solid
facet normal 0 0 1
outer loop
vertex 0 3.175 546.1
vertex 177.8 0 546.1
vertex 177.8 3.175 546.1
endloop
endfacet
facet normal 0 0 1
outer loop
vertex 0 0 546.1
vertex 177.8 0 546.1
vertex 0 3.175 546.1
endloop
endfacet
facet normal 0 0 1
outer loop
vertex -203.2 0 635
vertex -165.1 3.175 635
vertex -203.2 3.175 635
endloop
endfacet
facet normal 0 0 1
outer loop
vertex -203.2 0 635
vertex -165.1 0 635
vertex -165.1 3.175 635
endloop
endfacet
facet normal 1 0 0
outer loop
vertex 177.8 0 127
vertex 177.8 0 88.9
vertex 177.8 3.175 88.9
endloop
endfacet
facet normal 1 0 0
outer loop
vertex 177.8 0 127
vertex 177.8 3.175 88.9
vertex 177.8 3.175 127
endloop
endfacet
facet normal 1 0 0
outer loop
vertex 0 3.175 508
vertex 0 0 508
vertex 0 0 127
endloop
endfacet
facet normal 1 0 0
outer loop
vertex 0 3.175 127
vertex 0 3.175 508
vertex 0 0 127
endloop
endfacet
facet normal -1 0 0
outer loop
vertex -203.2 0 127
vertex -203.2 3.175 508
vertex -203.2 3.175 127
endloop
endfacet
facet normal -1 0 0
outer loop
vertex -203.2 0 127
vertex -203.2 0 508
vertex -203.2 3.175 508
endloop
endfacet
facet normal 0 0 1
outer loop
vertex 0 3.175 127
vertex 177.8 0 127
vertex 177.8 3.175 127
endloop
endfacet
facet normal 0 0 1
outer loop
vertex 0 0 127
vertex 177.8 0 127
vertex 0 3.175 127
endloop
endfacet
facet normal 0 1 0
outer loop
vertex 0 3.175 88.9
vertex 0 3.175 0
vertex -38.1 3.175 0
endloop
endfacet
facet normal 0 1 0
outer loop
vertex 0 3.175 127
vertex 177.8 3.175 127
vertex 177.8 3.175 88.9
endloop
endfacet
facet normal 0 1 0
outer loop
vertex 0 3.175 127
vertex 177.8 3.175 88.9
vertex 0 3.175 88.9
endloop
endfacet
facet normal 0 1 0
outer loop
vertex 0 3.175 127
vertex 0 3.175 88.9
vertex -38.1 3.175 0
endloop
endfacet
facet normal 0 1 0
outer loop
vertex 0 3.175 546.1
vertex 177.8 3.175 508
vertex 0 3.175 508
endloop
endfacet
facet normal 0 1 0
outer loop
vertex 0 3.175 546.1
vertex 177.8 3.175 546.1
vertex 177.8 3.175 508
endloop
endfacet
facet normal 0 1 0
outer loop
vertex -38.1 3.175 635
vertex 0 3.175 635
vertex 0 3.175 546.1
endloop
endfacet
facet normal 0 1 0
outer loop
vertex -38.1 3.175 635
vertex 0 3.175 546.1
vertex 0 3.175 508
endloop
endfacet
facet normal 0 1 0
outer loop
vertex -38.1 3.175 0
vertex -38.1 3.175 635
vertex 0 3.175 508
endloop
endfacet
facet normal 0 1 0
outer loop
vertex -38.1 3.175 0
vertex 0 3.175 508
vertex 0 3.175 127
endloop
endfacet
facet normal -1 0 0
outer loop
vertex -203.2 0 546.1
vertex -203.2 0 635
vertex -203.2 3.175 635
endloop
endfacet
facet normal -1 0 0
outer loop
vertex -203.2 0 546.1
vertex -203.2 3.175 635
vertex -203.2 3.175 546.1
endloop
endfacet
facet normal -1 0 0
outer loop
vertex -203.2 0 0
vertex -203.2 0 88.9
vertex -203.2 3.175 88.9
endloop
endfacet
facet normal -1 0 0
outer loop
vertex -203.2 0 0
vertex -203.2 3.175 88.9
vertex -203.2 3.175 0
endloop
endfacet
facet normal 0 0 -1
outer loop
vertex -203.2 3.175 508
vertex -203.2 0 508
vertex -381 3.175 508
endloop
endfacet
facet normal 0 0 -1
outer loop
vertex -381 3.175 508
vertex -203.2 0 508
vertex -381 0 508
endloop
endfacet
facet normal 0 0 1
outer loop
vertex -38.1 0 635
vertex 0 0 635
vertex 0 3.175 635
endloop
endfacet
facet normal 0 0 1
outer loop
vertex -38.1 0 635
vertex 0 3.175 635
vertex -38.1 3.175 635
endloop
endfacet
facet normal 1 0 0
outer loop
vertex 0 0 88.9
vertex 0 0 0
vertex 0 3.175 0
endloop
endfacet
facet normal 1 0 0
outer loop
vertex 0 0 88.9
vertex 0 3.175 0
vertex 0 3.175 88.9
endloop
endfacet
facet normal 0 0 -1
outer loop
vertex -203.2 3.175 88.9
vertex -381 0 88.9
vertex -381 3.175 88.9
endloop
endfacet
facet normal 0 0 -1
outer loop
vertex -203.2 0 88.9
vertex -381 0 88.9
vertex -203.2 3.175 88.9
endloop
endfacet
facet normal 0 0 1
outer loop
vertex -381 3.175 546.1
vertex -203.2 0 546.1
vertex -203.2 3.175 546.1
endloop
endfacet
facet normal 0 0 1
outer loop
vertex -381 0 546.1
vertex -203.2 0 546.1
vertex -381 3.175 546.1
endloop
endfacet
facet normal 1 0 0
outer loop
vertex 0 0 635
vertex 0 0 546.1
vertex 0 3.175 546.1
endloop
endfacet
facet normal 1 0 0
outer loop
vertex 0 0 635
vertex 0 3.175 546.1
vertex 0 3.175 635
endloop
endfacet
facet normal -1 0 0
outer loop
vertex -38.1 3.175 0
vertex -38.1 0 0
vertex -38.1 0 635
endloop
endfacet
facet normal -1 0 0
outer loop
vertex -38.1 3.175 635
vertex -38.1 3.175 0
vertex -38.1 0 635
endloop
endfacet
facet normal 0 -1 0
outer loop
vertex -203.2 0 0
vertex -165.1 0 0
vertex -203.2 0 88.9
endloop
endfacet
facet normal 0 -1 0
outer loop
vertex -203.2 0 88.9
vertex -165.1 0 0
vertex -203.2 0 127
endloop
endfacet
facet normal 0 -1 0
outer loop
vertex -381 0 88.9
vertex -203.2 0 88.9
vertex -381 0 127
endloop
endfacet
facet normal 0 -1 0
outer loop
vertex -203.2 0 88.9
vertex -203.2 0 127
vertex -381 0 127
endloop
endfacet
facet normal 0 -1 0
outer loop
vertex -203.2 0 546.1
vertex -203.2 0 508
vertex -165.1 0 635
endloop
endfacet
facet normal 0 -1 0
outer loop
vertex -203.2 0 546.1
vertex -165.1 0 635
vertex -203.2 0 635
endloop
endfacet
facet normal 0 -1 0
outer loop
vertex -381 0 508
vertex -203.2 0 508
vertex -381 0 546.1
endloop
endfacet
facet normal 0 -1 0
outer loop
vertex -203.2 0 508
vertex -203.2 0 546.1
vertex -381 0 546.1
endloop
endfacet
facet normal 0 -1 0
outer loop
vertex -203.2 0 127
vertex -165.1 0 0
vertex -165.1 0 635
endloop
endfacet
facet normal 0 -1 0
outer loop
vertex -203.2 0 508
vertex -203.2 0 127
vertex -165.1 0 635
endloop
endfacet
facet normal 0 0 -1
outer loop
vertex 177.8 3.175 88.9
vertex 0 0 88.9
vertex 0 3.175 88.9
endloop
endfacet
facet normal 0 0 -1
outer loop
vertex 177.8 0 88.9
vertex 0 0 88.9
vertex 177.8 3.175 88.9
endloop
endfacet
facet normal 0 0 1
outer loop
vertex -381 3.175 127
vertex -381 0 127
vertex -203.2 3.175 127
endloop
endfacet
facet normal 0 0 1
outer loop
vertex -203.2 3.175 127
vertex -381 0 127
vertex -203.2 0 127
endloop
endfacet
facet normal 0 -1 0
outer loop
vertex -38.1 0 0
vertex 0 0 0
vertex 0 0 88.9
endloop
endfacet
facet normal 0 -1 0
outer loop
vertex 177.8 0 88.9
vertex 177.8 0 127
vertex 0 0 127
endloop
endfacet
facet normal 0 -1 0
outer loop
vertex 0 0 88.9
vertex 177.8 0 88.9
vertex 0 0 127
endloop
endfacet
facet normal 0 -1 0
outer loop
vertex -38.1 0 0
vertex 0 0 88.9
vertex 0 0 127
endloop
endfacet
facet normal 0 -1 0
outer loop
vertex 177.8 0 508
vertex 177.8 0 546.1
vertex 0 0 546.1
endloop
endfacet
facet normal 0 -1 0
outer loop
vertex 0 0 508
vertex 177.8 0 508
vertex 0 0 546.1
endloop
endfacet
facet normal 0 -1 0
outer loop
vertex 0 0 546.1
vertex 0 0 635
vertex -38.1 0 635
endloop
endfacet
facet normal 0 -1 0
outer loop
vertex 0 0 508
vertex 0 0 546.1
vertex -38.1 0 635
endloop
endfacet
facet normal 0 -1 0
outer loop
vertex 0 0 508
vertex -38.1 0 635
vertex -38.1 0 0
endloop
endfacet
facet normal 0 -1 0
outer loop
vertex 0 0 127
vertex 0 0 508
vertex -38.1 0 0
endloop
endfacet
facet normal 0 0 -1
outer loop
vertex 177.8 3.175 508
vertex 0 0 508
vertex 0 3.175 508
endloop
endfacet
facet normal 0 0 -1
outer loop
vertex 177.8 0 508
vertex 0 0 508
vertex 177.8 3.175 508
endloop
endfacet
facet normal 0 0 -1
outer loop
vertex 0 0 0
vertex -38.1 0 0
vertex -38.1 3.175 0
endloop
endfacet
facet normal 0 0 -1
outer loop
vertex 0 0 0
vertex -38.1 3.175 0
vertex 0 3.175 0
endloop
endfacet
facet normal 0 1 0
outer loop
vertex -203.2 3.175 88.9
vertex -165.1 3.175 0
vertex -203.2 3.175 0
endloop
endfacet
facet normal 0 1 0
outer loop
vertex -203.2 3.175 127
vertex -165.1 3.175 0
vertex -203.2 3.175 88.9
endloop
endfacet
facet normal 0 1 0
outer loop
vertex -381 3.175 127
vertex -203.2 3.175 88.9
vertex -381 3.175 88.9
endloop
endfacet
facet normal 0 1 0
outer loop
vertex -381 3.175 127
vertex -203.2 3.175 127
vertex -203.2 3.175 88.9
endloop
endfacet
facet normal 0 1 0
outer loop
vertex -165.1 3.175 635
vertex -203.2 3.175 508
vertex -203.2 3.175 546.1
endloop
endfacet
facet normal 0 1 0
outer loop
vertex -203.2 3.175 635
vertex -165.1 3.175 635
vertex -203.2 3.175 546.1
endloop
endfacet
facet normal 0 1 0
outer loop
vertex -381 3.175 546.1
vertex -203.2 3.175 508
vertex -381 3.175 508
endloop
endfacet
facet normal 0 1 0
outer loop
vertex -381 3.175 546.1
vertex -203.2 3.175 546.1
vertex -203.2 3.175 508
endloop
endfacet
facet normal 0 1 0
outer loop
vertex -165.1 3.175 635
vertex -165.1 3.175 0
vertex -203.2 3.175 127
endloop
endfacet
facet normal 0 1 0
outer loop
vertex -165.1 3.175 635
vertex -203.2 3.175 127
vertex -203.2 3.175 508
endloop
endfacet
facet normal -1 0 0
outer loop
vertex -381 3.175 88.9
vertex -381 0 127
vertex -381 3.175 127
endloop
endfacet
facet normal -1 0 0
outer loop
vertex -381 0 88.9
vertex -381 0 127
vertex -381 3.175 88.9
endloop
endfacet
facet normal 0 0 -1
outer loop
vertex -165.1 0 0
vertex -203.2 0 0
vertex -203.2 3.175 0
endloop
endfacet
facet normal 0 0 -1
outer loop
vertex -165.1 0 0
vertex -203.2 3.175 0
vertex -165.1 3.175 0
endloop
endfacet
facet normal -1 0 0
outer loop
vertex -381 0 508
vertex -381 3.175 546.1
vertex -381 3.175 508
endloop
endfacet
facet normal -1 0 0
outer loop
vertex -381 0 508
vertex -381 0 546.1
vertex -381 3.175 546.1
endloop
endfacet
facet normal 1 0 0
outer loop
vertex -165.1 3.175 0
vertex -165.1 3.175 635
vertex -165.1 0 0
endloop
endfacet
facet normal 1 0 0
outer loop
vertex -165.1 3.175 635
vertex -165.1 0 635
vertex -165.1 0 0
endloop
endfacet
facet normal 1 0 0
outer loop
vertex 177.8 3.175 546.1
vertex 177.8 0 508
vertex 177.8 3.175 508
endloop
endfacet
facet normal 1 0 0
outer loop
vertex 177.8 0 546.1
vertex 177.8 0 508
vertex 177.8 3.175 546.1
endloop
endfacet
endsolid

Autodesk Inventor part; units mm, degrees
ref_plane "YZ Plane" through (0, 0, 0) normal (1, 0, 0) x (0, 1, 0)
ref_plane "XZ Plane" through (0, 0, 0) normal (0, 1, 0) x (-1, 0, 0)
ref_plane "XY Plane" through (0, 0, 0) normal (0, 0, 1) x (1, 0, 0)
sketch "Sketch1" plane through (0, 0, 0) normal (0, 1, 0) x (-1, 0, 0)
  line L0 (0, 0) -> (0, 88.9)
  line L1 (0, 88.9) -> (-177.8, 88.9)
  line L2 (-177.8, 88.9) -> (-177.8, 546.1)
  line L3 (-177.8, 546.1) -> (0, 546.1)
  line L4 (0, 546.1) -> (0, 635)
  line L5 (0, 635) -> (203.2, 635)
  line L6 (203.2, 635) -> (203.2, 546.1)
  line L7 (203.2, 546.1) -> (381, 546.1)
  line L8 (381, 546.1) -> (381, 88.9)
  line L9 (381, 88.9) -> (203.2, 88.9)
  line L10 (203.2, 88.9) -> (203.2, 0)
  line L11 (203.2, 0) -> (0, 0)
  dimension "d0" = 88.9
  dimension "d1" = 177.8
  dimension "d2" = 88.9
  dimension "d3" = 177.8
  dimension "d4" = 177.8
  dimension "d5" = 88.9
  dimension "d6" = 177.8
  dimension "d7" = 88.9
  dimension "d8" = 558.8
  dimension "d9" = 635
extrude "Extrusion1" add sketch "Sketch1" along normal blind 3.175
sketch "Sketch2" plane through (0, 0, 0) normal (0, -1, 0) x (1, 0, 0)
  line L0 (0, 0) -> (0, 88.9) projected
  line L1 (0, 546.1) -> (0, 635) projected
  line L2 (0, 635) -> (-203.2, 635) projected
  line L3 (-203.2, 546.1) -> (-381, 546.1) projected
  line L4 (-381, 88.9) -> (-203.2, 88.9) projected
  line L5 (-203.2, 0) -> (0, 0) projected
  line L6 (-38.1, 635) -> (-165.1, 635)
  line L7 (-165.1, 635) -> (-165.1, 0)
  line L8 (-165.1, 0) -> (-38.1, 0)
  line L9 (-38.1, 0) -> (-38.1, 635)
  line L10 (0, 546.1) -> (0, 88.9)
  line L11 (-203.2, 546.1) -> (-203.2, 88.9)
  line L12 (-203.2, 508) -> (-381, 508)
  line L13 (-381, 508) -> (-381, 127)
  line L14 (-381, 127) -> (-203.2, 127)
  line L15 (-203.2, 127) -> (-203.2, 508)
  line L16 (0, 508) -> (177.8, 508)
  line L17 (177.8, 508) -> (177.8, 127)
  line L18 (177.8, 127) -> (0, 127)
  line L19 (0, 127) -> (0, 508)
  dimension "d12" = 127
  dimension "d13" = 38.1
  dimension "d14" = 38.1
  dimension "d15" = 38.1
  dimension "d16" = 177.8
  dimension "d17" = 177.8
extrude "Extrusion2" cut sketch "Sketch2" against normal blind 25.4 contours L5 L7 L2 L9 | L10 L16 L17 L18 | L11 L14 L13 L12
properties part number "Aluminum Board"
